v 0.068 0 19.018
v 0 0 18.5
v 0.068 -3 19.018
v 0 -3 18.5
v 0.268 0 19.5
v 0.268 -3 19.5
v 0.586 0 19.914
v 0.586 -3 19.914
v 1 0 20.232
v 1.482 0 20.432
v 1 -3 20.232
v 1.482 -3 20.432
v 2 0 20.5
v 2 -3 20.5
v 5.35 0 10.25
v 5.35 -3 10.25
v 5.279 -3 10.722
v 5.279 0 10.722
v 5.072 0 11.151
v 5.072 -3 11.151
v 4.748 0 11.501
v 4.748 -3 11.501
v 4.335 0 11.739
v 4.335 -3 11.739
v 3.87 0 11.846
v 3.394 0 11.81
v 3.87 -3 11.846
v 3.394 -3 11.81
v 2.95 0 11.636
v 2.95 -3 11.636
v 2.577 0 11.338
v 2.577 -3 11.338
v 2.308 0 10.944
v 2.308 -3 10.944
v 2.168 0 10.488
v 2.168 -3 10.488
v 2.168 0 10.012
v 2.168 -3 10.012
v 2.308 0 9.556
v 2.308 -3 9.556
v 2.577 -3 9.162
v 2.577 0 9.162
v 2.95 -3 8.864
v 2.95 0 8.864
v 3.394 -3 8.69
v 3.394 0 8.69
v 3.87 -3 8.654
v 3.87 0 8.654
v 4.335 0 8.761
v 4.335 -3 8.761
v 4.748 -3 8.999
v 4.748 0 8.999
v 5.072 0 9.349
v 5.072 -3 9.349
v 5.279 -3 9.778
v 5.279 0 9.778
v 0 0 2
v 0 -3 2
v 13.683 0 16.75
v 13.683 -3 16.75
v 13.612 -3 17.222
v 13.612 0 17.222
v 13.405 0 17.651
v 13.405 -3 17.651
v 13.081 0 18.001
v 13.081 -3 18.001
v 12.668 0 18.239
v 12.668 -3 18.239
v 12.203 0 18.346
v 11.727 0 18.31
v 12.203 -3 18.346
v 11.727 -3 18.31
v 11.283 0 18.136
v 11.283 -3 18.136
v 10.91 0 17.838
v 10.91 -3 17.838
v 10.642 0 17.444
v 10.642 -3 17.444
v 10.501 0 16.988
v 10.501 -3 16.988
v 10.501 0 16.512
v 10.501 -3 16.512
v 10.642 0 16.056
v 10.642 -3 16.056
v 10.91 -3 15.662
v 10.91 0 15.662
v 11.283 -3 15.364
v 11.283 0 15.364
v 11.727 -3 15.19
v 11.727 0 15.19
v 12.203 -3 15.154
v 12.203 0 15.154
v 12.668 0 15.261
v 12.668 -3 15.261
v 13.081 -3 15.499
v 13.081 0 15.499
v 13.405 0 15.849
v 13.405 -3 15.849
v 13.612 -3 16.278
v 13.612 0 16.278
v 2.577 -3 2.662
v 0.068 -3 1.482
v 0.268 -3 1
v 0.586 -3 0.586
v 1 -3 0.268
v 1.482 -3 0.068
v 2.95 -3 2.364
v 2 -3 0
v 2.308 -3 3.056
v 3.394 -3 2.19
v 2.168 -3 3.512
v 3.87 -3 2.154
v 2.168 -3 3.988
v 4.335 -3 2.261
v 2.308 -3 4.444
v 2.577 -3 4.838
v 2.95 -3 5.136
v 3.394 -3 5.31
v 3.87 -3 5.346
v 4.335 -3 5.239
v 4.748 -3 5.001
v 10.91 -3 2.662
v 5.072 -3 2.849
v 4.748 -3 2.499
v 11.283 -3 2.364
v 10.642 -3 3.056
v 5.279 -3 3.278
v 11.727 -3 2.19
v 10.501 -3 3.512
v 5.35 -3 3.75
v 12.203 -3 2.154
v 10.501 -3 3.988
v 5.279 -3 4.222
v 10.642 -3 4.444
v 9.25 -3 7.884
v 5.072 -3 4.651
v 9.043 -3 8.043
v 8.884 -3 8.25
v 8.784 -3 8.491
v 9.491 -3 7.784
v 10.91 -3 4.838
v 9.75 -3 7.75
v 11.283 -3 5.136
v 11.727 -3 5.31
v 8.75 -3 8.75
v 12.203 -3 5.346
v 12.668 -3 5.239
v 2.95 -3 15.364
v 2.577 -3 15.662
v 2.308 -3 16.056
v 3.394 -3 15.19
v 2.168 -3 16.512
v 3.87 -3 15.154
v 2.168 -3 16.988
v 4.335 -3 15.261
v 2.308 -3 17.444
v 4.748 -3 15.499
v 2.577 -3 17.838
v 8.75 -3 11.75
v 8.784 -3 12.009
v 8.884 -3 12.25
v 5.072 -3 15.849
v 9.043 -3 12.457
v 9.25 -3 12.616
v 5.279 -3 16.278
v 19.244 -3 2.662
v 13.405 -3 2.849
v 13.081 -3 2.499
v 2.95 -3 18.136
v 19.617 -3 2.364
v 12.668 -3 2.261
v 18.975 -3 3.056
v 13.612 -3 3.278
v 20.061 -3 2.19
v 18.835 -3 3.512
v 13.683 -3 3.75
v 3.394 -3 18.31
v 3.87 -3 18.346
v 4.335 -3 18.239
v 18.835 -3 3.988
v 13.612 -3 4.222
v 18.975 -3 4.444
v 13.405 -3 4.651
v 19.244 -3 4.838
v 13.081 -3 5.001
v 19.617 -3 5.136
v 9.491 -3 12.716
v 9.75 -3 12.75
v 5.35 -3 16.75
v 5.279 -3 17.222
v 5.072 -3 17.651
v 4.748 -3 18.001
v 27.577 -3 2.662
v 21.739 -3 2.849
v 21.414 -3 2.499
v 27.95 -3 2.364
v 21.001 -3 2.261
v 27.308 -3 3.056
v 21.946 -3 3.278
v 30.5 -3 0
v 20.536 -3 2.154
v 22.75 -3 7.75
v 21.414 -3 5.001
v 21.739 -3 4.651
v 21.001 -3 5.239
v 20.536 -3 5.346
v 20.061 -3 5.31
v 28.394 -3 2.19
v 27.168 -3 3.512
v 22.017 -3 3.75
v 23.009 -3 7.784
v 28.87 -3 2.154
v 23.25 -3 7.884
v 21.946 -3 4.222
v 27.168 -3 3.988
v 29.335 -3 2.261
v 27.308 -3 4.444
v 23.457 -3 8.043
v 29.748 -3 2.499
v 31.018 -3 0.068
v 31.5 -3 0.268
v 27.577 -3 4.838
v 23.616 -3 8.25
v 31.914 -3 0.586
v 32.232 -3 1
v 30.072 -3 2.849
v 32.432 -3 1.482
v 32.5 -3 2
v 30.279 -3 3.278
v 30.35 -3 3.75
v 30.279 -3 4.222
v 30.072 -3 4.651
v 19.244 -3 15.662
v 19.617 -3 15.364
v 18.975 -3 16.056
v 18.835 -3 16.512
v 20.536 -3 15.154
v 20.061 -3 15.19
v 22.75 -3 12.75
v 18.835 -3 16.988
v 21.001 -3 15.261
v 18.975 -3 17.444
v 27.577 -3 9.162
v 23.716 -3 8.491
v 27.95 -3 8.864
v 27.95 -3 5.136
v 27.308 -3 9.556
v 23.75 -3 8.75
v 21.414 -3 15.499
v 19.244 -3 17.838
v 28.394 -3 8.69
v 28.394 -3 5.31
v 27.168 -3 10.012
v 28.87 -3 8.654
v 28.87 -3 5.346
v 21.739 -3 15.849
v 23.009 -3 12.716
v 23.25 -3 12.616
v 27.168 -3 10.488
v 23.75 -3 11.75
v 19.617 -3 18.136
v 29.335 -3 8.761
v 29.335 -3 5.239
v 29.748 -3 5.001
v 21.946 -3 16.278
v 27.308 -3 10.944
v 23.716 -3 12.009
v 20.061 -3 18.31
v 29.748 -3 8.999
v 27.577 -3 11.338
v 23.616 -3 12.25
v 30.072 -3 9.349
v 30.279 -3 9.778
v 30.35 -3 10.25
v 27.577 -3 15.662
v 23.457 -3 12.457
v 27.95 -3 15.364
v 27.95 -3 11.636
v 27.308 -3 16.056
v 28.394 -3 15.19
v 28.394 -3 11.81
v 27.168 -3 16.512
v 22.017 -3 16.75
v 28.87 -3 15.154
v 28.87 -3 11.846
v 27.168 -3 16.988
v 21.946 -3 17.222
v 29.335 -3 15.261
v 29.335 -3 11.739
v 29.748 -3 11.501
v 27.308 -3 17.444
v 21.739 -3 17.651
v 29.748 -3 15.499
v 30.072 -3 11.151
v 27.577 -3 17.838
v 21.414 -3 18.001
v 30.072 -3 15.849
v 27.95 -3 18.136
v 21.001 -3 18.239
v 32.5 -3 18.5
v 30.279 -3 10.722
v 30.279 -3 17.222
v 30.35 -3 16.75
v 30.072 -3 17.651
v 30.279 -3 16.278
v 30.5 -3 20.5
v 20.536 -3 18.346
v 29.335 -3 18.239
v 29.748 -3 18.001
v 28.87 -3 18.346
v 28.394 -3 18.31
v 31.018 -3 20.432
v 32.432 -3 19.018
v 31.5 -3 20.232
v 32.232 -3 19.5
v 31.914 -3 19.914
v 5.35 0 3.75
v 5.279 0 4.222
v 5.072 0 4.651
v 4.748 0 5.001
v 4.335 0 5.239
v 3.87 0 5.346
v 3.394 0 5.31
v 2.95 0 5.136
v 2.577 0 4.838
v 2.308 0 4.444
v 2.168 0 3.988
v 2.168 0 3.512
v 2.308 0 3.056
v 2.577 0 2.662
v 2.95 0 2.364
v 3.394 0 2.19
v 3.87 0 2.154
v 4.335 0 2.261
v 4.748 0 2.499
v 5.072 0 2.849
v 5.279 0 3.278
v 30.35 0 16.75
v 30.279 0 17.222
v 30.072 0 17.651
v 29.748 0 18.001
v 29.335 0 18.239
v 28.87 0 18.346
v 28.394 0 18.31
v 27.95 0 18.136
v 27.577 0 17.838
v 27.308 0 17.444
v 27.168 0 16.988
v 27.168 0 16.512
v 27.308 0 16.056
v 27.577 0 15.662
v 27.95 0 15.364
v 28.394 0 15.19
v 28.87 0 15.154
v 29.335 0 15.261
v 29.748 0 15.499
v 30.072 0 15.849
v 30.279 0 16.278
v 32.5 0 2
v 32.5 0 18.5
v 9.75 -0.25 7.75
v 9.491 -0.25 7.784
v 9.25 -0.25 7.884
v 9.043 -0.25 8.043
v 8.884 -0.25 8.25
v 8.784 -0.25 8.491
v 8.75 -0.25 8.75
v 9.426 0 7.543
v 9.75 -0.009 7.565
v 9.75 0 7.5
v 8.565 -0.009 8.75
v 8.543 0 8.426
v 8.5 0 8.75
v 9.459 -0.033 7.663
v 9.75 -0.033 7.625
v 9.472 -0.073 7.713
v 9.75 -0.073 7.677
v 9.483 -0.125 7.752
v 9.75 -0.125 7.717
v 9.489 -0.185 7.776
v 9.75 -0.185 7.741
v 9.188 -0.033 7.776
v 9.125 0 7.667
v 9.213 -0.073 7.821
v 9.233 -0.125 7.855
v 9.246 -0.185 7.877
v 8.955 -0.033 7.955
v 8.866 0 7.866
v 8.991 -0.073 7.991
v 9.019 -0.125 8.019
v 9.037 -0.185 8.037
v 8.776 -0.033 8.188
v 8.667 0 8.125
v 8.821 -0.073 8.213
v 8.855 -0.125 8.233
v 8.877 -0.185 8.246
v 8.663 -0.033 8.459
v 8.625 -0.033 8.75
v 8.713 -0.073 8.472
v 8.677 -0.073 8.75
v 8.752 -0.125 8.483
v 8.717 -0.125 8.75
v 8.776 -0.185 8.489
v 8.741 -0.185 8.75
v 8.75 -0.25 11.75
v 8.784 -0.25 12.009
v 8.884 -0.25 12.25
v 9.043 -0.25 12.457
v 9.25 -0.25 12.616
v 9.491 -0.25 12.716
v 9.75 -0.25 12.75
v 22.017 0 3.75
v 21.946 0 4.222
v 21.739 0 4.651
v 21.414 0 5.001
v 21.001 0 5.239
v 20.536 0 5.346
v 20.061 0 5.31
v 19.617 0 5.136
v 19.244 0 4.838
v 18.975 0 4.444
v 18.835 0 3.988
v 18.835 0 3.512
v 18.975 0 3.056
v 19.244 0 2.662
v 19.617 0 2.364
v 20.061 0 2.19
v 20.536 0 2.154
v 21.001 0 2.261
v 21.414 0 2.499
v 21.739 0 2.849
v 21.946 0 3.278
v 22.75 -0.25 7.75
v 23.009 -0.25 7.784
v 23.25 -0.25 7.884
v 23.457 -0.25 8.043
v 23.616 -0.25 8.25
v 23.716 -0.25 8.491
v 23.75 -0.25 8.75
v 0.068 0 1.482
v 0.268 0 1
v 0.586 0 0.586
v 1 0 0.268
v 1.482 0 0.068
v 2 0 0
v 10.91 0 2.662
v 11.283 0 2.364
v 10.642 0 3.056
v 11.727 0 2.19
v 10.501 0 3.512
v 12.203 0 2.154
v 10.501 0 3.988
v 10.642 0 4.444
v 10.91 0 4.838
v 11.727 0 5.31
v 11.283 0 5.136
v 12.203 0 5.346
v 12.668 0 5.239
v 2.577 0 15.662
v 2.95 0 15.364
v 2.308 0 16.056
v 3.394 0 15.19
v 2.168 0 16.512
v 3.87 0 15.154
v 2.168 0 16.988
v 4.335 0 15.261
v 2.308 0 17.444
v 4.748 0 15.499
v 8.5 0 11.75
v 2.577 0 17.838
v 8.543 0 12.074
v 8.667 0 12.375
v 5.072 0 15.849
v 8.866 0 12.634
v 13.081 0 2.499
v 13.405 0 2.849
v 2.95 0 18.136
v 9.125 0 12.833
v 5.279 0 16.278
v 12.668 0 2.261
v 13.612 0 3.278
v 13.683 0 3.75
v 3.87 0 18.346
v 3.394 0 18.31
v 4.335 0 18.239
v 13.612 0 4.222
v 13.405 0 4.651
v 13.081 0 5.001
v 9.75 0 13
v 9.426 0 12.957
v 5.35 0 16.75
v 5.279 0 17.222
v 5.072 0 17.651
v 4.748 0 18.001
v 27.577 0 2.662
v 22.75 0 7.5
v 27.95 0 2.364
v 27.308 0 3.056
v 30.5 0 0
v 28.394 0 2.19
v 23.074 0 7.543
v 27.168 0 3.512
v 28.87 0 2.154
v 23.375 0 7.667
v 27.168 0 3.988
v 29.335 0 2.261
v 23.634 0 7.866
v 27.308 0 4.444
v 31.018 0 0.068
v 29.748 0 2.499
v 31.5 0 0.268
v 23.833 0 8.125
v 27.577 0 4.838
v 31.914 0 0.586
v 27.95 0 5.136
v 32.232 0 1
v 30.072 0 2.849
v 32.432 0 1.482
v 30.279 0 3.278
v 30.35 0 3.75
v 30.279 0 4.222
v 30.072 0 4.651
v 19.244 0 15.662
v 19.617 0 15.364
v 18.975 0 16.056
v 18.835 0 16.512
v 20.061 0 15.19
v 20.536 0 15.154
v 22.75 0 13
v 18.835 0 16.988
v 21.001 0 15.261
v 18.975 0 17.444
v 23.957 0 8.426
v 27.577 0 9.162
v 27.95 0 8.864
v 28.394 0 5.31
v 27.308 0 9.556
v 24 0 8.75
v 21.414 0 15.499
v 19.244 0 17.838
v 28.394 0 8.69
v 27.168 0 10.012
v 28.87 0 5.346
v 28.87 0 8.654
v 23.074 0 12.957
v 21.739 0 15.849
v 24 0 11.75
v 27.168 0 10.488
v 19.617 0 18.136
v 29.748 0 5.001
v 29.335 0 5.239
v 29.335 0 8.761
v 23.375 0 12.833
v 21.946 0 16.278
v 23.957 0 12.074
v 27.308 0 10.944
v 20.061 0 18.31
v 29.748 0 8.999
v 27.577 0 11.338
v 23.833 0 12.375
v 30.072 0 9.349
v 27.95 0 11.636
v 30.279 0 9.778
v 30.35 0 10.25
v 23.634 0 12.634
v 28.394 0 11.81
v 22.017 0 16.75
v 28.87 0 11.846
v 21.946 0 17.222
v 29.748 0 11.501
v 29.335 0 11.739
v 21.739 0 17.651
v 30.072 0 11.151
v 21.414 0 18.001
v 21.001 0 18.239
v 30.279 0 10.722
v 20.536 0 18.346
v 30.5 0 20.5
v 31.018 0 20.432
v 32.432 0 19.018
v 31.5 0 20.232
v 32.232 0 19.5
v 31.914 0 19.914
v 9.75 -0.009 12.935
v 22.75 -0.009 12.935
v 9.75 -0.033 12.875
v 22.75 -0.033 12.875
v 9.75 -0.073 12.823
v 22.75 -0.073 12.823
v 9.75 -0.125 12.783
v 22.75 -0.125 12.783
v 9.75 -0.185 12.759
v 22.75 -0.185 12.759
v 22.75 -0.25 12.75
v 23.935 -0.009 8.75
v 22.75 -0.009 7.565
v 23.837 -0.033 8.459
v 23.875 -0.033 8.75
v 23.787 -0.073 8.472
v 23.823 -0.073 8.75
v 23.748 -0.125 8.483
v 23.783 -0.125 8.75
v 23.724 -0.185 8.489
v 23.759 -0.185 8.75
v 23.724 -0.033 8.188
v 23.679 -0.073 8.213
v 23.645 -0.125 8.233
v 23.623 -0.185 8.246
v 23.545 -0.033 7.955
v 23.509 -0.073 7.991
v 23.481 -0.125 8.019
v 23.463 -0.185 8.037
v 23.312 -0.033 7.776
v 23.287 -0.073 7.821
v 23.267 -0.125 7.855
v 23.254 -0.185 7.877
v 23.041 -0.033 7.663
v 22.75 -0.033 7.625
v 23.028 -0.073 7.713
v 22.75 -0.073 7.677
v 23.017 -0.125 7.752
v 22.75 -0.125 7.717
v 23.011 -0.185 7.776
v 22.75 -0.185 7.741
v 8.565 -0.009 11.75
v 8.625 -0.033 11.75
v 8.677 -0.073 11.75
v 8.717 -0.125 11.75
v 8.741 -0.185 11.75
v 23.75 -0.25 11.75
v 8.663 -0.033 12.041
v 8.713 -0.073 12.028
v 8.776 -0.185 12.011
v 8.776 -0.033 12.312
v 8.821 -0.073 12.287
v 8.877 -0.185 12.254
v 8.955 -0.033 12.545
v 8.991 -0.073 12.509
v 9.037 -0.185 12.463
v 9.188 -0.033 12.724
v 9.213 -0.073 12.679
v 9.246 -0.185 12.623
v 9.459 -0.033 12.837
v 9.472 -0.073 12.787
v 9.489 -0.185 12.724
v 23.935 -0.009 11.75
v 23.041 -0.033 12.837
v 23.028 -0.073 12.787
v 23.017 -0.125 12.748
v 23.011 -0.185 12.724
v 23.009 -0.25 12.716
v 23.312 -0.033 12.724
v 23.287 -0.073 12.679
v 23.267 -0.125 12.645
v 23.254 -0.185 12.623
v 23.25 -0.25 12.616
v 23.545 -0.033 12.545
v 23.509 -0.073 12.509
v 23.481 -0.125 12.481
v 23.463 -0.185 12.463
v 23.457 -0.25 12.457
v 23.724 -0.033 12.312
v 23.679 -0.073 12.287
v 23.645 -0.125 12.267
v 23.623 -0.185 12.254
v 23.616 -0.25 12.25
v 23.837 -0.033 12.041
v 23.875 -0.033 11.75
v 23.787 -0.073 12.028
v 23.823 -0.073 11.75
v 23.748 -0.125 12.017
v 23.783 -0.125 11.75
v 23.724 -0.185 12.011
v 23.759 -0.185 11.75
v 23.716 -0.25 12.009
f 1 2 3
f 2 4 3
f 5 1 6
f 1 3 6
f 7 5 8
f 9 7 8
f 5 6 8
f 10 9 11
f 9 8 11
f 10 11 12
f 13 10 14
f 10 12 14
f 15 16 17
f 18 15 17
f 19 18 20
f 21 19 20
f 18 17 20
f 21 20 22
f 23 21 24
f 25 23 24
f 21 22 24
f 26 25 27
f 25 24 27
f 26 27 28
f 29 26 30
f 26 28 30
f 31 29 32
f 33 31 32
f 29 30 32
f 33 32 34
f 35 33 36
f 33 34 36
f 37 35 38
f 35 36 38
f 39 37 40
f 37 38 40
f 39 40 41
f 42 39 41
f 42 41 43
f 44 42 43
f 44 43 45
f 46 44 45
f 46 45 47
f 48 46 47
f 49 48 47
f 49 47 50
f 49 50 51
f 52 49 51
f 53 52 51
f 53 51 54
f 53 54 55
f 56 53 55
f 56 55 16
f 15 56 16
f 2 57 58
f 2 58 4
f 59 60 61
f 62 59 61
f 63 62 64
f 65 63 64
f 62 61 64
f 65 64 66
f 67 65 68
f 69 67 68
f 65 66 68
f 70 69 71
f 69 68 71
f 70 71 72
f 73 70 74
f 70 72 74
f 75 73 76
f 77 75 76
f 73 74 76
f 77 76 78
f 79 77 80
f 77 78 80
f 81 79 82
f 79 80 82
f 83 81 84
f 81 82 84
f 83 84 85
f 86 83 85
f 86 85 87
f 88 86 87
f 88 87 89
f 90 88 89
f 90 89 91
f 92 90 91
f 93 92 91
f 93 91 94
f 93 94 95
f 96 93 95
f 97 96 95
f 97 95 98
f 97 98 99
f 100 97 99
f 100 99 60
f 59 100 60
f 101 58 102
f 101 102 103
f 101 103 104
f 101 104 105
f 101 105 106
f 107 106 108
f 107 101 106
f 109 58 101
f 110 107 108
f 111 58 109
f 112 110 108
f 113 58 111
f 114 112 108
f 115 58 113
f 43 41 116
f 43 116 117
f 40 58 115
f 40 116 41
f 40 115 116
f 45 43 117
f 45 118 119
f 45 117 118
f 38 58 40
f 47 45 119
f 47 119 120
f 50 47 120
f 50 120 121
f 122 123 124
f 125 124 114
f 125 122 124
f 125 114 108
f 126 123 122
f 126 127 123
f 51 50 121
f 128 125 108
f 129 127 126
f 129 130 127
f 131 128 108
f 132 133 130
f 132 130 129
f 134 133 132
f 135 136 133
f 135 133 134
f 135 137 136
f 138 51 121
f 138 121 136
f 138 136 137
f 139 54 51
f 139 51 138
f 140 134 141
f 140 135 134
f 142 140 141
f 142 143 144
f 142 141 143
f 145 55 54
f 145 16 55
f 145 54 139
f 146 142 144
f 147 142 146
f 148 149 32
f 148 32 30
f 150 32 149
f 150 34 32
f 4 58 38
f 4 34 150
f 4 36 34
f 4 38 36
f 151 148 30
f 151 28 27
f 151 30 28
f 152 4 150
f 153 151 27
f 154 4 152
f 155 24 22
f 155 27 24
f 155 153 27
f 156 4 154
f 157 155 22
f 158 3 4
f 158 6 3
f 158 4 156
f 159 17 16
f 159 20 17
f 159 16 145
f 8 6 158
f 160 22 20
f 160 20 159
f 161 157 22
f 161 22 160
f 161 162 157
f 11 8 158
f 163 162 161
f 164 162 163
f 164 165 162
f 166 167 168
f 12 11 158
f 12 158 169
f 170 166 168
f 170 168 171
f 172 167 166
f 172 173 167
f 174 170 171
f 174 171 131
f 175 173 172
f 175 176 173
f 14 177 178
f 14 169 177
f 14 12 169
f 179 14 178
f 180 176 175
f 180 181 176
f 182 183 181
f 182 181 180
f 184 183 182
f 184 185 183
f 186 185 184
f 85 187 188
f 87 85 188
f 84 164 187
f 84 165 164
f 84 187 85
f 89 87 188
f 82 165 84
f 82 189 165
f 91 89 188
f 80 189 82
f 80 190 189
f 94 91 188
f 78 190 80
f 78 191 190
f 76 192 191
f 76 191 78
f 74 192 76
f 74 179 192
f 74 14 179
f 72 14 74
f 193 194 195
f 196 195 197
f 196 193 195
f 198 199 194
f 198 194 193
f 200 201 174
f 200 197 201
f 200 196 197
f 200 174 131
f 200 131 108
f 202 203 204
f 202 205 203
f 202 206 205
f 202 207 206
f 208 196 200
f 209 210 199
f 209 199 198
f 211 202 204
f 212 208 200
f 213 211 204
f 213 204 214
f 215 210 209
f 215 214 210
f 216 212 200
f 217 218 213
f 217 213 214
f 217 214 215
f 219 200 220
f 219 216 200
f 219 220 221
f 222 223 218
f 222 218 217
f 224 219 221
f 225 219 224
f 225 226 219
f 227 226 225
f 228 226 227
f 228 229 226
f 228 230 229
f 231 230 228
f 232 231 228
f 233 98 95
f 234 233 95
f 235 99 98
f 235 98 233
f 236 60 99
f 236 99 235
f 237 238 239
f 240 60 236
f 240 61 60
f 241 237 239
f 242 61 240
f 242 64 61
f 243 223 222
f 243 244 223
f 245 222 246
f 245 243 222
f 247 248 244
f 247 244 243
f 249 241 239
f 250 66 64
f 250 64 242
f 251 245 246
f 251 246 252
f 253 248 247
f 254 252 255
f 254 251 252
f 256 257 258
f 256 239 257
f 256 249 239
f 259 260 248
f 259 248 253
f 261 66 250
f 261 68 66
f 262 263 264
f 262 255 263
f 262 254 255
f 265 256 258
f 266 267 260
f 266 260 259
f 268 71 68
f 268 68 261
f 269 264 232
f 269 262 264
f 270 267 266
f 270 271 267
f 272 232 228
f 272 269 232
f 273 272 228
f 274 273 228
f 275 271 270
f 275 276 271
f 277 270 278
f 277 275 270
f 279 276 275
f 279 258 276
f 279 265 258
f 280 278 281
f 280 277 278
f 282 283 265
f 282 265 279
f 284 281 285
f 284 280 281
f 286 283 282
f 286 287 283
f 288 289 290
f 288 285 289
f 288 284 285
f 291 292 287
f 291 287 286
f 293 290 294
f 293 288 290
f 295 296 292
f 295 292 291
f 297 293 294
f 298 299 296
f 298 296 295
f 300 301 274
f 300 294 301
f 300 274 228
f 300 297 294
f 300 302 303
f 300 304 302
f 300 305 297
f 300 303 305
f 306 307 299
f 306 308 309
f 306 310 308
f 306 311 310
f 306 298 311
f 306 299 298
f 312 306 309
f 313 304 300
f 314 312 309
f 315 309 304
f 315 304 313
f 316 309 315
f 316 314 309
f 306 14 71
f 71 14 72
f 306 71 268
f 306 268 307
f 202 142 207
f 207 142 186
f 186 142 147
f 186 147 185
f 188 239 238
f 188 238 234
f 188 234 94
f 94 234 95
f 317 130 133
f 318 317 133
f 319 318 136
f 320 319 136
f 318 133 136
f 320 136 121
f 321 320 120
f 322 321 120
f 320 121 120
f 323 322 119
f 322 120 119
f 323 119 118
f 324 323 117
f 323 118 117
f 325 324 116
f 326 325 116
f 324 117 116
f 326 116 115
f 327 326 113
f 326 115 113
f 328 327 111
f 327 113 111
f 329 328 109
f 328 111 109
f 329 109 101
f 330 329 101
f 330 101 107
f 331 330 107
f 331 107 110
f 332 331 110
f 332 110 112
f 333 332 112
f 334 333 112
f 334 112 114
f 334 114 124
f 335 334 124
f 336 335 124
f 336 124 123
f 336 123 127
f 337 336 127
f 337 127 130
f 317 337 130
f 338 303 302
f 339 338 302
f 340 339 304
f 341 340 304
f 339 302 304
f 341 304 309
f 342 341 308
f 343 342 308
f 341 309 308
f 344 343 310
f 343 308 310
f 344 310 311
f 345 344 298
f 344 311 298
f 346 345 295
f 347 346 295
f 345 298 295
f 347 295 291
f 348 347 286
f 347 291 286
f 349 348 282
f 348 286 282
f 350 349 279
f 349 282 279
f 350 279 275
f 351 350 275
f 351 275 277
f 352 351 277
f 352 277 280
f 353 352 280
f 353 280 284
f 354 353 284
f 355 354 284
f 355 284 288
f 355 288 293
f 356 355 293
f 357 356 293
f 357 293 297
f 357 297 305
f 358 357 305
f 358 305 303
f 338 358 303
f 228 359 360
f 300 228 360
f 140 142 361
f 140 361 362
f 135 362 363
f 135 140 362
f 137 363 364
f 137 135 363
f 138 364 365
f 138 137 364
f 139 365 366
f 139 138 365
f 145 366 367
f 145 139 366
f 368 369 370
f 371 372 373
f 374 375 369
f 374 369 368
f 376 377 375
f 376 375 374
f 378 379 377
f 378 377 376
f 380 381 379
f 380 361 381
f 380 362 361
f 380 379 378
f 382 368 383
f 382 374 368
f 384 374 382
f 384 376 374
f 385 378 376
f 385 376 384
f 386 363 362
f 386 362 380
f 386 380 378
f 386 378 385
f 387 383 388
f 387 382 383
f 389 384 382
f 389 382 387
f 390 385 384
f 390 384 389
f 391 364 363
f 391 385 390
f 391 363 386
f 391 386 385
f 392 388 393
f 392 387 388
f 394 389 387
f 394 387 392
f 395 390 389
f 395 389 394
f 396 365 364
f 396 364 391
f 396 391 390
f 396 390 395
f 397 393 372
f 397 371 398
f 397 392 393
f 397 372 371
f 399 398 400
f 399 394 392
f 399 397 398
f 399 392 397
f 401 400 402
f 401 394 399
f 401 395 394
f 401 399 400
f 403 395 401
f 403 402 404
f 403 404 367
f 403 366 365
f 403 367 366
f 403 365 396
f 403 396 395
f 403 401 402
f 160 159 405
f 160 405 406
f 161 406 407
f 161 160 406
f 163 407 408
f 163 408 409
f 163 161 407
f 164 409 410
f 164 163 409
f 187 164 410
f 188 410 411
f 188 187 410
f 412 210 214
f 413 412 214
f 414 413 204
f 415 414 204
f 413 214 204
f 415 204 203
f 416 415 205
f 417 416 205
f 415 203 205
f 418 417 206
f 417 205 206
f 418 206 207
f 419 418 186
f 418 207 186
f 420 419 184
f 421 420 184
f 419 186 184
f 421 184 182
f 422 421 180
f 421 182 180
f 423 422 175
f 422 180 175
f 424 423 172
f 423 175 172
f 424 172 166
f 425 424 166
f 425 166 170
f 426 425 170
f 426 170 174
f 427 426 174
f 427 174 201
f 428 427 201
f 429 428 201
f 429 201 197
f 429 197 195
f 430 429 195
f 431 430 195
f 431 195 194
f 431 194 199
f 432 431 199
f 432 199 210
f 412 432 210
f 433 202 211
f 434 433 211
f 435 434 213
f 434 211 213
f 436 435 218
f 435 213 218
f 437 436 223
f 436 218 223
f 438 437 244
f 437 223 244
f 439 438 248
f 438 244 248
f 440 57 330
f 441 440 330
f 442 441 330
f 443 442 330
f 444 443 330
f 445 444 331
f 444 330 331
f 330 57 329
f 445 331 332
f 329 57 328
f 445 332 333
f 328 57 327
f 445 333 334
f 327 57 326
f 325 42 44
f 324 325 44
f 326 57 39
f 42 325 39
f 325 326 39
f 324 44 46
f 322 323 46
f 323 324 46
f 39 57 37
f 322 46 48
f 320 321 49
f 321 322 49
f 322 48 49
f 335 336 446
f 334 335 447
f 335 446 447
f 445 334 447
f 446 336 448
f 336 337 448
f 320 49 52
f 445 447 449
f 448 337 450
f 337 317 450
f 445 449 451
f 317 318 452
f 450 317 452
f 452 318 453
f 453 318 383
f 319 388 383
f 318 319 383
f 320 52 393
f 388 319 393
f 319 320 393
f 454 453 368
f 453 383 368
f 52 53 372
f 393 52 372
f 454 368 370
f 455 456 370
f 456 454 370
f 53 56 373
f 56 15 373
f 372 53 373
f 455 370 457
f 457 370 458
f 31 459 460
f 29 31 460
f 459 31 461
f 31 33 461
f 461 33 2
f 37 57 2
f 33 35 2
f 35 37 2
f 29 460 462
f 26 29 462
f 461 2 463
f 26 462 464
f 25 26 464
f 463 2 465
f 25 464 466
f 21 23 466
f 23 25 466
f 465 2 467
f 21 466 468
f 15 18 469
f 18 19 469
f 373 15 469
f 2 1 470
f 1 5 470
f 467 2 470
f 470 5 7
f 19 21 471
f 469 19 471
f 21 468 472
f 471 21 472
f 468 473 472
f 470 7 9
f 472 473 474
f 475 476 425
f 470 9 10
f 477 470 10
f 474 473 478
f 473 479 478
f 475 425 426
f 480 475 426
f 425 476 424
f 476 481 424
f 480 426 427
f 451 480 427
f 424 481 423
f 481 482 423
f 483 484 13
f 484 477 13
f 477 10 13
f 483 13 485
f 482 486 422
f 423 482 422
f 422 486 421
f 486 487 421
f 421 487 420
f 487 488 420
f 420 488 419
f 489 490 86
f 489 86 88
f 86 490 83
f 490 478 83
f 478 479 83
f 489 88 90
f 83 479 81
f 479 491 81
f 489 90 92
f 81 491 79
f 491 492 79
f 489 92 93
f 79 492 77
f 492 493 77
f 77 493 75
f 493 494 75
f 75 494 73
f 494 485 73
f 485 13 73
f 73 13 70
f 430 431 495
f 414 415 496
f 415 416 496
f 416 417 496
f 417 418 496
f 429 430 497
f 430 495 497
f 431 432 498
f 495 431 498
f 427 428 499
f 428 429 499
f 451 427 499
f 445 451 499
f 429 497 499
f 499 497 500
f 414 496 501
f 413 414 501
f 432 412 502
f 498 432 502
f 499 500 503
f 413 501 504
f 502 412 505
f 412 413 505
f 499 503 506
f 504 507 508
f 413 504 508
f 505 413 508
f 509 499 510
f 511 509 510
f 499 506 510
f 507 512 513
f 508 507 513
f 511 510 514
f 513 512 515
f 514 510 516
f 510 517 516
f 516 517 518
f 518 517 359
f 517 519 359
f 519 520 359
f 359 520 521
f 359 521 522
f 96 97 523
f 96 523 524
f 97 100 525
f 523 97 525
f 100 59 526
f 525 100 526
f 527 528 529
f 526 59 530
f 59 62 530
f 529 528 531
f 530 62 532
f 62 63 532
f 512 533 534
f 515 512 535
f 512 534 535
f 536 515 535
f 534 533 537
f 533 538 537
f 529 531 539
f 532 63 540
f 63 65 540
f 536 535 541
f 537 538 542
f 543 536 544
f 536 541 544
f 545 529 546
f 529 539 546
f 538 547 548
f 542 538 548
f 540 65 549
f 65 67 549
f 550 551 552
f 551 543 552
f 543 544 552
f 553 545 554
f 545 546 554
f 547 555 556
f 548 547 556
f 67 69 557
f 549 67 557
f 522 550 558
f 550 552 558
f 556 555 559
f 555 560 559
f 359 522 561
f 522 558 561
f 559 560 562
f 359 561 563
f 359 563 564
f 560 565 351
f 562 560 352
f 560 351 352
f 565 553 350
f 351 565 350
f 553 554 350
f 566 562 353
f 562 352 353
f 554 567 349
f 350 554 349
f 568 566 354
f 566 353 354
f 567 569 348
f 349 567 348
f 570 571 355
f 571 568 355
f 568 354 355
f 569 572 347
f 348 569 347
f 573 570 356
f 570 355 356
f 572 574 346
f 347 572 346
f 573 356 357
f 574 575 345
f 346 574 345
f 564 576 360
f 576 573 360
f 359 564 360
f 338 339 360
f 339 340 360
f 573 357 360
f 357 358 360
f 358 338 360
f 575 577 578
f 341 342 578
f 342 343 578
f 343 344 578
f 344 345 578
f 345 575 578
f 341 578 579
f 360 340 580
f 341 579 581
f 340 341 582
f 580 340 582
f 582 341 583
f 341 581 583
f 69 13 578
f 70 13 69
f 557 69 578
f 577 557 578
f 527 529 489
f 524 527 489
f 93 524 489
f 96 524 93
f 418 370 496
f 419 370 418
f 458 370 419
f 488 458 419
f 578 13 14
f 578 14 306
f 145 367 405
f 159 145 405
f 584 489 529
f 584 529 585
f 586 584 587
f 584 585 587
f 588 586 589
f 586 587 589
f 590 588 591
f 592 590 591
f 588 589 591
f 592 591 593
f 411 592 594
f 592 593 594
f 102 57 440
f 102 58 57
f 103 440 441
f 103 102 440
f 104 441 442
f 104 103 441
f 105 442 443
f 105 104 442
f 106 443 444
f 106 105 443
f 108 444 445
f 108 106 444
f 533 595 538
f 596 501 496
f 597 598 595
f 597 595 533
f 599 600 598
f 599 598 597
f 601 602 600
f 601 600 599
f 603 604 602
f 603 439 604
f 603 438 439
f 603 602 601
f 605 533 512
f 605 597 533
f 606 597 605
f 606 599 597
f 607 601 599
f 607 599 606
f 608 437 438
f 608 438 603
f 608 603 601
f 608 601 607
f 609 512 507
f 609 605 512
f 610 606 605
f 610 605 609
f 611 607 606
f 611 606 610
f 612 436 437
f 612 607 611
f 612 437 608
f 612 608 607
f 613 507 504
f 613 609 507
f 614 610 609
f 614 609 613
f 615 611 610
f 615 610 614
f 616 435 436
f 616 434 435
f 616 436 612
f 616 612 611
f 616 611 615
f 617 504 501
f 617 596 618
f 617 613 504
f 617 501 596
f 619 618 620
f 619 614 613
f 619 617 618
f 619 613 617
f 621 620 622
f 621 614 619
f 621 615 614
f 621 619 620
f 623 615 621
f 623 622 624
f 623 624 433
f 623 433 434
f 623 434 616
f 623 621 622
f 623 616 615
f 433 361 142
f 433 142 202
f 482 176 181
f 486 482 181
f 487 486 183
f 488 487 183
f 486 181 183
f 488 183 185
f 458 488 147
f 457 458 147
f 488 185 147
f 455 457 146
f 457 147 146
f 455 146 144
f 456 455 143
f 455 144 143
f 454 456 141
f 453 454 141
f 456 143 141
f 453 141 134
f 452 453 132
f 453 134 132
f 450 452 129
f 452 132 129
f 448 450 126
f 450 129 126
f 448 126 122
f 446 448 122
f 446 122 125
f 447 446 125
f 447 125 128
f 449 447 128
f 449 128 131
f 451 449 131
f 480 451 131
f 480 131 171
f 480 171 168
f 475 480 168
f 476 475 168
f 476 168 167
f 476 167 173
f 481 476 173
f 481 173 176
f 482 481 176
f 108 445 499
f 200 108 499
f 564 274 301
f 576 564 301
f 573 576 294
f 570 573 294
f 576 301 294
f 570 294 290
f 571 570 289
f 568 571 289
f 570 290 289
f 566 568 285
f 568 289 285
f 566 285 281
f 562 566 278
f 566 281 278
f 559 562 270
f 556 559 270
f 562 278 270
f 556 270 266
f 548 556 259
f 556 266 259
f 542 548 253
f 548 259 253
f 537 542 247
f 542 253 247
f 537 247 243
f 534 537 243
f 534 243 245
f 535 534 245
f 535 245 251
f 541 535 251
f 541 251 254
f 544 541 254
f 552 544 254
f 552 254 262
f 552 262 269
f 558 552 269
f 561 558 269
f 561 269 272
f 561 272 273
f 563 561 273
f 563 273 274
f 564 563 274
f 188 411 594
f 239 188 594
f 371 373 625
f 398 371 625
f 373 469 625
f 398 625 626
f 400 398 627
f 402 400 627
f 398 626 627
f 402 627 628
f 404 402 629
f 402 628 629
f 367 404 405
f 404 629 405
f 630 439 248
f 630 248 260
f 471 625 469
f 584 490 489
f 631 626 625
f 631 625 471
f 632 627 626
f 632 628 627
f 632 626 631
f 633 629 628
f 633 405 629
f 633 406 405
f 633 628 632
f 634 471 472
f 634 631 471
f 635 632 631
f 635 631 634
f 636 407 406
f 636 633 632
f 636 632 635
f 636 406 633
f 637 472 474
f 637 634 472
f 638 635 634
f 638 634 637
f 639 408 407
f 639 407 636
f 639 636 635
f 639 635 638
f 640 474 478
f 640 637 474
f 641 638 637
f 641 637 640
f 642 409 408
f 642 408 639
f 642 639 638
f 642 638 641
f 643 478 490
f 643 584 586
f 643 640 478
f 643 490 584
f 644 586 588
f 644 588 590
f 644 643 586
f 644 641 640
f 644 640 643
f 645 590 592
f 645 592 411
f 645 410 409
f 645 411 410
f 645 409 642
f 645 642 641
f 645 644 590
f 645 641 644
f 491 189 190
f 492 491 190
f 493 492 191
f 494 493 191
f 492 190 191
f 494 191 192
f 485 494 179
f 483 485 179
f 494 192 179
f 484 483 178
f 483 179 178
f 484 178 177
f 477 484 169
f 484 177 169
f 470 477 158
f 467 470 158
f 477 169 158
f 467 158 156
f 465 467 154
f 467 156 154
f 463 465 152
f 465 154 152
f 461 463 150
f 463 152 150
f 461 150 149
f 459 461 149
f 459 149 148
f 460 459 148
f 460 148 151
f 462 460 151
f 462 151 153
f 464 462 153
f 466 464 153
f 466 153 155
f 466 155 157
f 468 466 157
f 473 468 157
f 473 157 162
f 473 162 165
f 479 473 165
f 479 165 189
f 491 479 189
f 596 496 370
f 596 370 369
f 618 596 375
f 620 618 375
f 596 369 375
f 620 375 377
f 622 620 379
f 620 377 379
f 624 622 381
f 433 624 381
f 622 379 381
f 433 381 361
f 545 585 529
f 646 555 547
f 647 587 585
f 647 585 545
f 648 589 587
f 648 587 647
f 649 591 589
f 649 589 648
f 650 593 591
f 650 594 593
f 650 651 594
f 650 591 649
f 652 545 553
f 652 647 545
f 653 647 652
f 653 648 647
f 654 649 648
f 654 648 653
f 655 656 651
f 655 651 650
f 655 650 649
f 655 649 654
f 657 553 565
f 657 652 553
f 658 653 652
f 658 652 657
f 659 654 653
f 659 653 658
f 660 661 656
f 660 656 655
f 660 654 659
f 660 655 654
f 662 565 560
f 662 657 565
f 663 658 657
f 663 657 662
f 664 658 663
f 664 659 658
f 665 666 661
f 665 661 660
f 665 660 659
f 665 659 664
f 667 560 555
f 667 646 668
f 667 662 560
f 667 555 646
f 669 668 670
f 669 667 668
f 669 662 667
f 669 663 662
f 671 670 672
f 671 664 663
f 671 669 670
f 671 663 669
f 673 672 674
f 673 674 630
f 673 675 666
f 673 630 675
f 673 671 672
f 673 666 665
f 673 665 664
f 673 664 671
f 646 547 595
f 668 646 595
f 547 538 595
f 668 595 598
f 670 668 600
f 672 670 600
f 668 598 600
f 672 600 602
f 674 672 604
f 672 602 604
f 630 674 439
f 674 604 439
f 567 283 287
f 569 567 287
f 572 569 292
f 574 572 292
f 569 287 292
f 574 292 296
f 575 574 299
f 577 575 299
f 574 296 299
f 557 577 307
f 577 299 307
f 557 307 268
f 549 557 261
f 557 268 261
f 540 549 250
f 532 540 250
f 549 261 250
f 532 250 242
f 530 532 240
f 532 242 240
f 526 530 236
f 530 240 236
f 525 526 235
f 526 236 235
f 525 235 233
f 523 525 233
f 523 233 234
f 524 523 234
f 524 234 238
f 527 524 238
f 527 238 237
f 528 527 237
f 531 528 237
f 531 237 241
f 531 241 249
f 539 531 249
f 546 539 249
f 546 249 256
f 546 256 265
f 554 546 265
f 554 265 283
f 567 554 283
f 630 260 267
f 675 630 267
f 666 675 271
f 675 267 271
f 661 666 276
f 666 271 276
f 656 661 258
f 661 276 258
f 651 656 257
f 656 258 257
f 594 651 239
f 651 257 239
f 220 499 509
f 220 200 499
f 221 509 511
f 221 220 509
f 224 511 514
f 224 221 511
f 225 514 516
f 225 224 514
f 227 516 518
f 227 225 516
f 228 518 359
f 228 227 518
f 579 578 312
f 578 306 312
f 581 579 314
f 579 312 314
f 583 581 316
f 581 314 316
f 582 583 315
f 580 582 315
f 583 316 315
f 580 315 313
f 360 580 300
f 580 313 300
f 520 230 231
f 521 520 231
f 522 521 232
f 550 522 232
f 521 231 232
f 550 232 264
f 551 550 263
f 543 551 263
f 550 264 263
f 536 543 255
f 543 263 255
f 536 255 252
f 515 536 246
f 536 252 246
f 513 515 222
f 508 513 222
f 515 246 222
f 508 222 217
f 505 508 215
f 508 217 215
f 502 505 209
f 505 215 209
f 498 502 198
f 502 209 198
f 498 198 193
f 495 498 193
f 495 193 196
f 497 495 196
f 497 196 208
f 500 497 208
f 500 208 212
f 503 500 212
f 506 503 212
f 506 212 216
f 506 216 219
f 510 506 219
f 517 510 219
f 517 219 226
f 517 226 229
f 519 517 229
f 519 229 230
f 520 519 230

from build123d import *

# Parameters (mm, degrees)
F0_W     = 32.5
F0_H     = 20.5
F0_W_2   = 15
F0_H_2   = 5
F1_DEPTH = 3
F2_R     = 1.6
F3_DEPTH = 25
F4_R     = 1
F5_R     = 0.25
F6_R     = 2


with BuildPart() as f1:
    # F0 (on Front) → F1 (new body)
    with BuildSketch(Plane.XZ):
        with Locations((16.25, 10.25)):
            Rectangle(F0_W, F0_H)
        with Locations((16.25, 10.25)):
            Rectangle(F0_W_2, F0_H_2, mode=Mode.SUBTRACT)
    extrude(amount=F1_DEPTH)

    # F2 (on face) → F3 (cut)
    with BuildSketch(Plane.XZ.offset(3)):
        with Locations((3.75, 16.75)):
            Circle(F2_R)
        with Locations((3.75, 10.25)):
            Circle(F2_R)
        with Locations((3.75, 3.75)):
            Circle(F2_R)
        with Locations((12.0833333333, 16.75)):
            Circle(F2_R)
        with Locations((12.0833333333, 10.25)):
            Circle(F2_R)
        with Locations((12.0833333333, 3.75)):
            Circle(F2_R)
        with Locations((20.4166666667, 16.75)):
            Circle(F2_R)
        with Locations((20.4166666667, 10.25)):
            Circle(F2_R)
        with Locations((20.4166666667, 3.75)):
            Circle(F2_R)
        with Locations((28.75, 16.75)):
            Circle(F2_R)
        with Locations((28.75, 10.25)):
            Circle(F2_R)
        with Locations((28.75, 3.75)):
            Circle(F2_R)
    extrude(amount=-F3_DEPTH, mode=Mode.SUBTRACT)

    # F4
    f4_edges = [f1.edges().sort_by_distance(p)[0] for p in [
        (8.75, -1.5, 7.75),
        (8.75, -1.5, 12.75),
        (23.75, -1.5, 12.75),
        (23.75, -1.5, 7.75),
    ]]
    fillet(f4_edges, radius=F4_R)

    # F5
    f5_edges = [f1.edges().sort_by_distance(p)[0] for p in [
        (16.25, 0, 12.75),
        (9.042893, 0, 12.457107),
        (8.75, 0, 10.25),
        (9.042893, 0, 8.042893),
        (16.25, 0, 7.75),
        (23.457107, 0, 8.042893),
        (23.75, 0, 10.25),
        (23.457107, 0, 12.457107),
    ]]
    fillet(f5_edges, radius=F5_R)

    # F6
    f6_edges = [f1.edges().sort_by_distance(p)[0] for p in [
        (32.5, -1.5, 20.5),
        (32.5, -1.5, 0),
        (0, -1.5, 0),
        (0, -1.5, 20.5),
    ]]
    fillet(f6_edges, radius=F6_R)


solid = f1.part
